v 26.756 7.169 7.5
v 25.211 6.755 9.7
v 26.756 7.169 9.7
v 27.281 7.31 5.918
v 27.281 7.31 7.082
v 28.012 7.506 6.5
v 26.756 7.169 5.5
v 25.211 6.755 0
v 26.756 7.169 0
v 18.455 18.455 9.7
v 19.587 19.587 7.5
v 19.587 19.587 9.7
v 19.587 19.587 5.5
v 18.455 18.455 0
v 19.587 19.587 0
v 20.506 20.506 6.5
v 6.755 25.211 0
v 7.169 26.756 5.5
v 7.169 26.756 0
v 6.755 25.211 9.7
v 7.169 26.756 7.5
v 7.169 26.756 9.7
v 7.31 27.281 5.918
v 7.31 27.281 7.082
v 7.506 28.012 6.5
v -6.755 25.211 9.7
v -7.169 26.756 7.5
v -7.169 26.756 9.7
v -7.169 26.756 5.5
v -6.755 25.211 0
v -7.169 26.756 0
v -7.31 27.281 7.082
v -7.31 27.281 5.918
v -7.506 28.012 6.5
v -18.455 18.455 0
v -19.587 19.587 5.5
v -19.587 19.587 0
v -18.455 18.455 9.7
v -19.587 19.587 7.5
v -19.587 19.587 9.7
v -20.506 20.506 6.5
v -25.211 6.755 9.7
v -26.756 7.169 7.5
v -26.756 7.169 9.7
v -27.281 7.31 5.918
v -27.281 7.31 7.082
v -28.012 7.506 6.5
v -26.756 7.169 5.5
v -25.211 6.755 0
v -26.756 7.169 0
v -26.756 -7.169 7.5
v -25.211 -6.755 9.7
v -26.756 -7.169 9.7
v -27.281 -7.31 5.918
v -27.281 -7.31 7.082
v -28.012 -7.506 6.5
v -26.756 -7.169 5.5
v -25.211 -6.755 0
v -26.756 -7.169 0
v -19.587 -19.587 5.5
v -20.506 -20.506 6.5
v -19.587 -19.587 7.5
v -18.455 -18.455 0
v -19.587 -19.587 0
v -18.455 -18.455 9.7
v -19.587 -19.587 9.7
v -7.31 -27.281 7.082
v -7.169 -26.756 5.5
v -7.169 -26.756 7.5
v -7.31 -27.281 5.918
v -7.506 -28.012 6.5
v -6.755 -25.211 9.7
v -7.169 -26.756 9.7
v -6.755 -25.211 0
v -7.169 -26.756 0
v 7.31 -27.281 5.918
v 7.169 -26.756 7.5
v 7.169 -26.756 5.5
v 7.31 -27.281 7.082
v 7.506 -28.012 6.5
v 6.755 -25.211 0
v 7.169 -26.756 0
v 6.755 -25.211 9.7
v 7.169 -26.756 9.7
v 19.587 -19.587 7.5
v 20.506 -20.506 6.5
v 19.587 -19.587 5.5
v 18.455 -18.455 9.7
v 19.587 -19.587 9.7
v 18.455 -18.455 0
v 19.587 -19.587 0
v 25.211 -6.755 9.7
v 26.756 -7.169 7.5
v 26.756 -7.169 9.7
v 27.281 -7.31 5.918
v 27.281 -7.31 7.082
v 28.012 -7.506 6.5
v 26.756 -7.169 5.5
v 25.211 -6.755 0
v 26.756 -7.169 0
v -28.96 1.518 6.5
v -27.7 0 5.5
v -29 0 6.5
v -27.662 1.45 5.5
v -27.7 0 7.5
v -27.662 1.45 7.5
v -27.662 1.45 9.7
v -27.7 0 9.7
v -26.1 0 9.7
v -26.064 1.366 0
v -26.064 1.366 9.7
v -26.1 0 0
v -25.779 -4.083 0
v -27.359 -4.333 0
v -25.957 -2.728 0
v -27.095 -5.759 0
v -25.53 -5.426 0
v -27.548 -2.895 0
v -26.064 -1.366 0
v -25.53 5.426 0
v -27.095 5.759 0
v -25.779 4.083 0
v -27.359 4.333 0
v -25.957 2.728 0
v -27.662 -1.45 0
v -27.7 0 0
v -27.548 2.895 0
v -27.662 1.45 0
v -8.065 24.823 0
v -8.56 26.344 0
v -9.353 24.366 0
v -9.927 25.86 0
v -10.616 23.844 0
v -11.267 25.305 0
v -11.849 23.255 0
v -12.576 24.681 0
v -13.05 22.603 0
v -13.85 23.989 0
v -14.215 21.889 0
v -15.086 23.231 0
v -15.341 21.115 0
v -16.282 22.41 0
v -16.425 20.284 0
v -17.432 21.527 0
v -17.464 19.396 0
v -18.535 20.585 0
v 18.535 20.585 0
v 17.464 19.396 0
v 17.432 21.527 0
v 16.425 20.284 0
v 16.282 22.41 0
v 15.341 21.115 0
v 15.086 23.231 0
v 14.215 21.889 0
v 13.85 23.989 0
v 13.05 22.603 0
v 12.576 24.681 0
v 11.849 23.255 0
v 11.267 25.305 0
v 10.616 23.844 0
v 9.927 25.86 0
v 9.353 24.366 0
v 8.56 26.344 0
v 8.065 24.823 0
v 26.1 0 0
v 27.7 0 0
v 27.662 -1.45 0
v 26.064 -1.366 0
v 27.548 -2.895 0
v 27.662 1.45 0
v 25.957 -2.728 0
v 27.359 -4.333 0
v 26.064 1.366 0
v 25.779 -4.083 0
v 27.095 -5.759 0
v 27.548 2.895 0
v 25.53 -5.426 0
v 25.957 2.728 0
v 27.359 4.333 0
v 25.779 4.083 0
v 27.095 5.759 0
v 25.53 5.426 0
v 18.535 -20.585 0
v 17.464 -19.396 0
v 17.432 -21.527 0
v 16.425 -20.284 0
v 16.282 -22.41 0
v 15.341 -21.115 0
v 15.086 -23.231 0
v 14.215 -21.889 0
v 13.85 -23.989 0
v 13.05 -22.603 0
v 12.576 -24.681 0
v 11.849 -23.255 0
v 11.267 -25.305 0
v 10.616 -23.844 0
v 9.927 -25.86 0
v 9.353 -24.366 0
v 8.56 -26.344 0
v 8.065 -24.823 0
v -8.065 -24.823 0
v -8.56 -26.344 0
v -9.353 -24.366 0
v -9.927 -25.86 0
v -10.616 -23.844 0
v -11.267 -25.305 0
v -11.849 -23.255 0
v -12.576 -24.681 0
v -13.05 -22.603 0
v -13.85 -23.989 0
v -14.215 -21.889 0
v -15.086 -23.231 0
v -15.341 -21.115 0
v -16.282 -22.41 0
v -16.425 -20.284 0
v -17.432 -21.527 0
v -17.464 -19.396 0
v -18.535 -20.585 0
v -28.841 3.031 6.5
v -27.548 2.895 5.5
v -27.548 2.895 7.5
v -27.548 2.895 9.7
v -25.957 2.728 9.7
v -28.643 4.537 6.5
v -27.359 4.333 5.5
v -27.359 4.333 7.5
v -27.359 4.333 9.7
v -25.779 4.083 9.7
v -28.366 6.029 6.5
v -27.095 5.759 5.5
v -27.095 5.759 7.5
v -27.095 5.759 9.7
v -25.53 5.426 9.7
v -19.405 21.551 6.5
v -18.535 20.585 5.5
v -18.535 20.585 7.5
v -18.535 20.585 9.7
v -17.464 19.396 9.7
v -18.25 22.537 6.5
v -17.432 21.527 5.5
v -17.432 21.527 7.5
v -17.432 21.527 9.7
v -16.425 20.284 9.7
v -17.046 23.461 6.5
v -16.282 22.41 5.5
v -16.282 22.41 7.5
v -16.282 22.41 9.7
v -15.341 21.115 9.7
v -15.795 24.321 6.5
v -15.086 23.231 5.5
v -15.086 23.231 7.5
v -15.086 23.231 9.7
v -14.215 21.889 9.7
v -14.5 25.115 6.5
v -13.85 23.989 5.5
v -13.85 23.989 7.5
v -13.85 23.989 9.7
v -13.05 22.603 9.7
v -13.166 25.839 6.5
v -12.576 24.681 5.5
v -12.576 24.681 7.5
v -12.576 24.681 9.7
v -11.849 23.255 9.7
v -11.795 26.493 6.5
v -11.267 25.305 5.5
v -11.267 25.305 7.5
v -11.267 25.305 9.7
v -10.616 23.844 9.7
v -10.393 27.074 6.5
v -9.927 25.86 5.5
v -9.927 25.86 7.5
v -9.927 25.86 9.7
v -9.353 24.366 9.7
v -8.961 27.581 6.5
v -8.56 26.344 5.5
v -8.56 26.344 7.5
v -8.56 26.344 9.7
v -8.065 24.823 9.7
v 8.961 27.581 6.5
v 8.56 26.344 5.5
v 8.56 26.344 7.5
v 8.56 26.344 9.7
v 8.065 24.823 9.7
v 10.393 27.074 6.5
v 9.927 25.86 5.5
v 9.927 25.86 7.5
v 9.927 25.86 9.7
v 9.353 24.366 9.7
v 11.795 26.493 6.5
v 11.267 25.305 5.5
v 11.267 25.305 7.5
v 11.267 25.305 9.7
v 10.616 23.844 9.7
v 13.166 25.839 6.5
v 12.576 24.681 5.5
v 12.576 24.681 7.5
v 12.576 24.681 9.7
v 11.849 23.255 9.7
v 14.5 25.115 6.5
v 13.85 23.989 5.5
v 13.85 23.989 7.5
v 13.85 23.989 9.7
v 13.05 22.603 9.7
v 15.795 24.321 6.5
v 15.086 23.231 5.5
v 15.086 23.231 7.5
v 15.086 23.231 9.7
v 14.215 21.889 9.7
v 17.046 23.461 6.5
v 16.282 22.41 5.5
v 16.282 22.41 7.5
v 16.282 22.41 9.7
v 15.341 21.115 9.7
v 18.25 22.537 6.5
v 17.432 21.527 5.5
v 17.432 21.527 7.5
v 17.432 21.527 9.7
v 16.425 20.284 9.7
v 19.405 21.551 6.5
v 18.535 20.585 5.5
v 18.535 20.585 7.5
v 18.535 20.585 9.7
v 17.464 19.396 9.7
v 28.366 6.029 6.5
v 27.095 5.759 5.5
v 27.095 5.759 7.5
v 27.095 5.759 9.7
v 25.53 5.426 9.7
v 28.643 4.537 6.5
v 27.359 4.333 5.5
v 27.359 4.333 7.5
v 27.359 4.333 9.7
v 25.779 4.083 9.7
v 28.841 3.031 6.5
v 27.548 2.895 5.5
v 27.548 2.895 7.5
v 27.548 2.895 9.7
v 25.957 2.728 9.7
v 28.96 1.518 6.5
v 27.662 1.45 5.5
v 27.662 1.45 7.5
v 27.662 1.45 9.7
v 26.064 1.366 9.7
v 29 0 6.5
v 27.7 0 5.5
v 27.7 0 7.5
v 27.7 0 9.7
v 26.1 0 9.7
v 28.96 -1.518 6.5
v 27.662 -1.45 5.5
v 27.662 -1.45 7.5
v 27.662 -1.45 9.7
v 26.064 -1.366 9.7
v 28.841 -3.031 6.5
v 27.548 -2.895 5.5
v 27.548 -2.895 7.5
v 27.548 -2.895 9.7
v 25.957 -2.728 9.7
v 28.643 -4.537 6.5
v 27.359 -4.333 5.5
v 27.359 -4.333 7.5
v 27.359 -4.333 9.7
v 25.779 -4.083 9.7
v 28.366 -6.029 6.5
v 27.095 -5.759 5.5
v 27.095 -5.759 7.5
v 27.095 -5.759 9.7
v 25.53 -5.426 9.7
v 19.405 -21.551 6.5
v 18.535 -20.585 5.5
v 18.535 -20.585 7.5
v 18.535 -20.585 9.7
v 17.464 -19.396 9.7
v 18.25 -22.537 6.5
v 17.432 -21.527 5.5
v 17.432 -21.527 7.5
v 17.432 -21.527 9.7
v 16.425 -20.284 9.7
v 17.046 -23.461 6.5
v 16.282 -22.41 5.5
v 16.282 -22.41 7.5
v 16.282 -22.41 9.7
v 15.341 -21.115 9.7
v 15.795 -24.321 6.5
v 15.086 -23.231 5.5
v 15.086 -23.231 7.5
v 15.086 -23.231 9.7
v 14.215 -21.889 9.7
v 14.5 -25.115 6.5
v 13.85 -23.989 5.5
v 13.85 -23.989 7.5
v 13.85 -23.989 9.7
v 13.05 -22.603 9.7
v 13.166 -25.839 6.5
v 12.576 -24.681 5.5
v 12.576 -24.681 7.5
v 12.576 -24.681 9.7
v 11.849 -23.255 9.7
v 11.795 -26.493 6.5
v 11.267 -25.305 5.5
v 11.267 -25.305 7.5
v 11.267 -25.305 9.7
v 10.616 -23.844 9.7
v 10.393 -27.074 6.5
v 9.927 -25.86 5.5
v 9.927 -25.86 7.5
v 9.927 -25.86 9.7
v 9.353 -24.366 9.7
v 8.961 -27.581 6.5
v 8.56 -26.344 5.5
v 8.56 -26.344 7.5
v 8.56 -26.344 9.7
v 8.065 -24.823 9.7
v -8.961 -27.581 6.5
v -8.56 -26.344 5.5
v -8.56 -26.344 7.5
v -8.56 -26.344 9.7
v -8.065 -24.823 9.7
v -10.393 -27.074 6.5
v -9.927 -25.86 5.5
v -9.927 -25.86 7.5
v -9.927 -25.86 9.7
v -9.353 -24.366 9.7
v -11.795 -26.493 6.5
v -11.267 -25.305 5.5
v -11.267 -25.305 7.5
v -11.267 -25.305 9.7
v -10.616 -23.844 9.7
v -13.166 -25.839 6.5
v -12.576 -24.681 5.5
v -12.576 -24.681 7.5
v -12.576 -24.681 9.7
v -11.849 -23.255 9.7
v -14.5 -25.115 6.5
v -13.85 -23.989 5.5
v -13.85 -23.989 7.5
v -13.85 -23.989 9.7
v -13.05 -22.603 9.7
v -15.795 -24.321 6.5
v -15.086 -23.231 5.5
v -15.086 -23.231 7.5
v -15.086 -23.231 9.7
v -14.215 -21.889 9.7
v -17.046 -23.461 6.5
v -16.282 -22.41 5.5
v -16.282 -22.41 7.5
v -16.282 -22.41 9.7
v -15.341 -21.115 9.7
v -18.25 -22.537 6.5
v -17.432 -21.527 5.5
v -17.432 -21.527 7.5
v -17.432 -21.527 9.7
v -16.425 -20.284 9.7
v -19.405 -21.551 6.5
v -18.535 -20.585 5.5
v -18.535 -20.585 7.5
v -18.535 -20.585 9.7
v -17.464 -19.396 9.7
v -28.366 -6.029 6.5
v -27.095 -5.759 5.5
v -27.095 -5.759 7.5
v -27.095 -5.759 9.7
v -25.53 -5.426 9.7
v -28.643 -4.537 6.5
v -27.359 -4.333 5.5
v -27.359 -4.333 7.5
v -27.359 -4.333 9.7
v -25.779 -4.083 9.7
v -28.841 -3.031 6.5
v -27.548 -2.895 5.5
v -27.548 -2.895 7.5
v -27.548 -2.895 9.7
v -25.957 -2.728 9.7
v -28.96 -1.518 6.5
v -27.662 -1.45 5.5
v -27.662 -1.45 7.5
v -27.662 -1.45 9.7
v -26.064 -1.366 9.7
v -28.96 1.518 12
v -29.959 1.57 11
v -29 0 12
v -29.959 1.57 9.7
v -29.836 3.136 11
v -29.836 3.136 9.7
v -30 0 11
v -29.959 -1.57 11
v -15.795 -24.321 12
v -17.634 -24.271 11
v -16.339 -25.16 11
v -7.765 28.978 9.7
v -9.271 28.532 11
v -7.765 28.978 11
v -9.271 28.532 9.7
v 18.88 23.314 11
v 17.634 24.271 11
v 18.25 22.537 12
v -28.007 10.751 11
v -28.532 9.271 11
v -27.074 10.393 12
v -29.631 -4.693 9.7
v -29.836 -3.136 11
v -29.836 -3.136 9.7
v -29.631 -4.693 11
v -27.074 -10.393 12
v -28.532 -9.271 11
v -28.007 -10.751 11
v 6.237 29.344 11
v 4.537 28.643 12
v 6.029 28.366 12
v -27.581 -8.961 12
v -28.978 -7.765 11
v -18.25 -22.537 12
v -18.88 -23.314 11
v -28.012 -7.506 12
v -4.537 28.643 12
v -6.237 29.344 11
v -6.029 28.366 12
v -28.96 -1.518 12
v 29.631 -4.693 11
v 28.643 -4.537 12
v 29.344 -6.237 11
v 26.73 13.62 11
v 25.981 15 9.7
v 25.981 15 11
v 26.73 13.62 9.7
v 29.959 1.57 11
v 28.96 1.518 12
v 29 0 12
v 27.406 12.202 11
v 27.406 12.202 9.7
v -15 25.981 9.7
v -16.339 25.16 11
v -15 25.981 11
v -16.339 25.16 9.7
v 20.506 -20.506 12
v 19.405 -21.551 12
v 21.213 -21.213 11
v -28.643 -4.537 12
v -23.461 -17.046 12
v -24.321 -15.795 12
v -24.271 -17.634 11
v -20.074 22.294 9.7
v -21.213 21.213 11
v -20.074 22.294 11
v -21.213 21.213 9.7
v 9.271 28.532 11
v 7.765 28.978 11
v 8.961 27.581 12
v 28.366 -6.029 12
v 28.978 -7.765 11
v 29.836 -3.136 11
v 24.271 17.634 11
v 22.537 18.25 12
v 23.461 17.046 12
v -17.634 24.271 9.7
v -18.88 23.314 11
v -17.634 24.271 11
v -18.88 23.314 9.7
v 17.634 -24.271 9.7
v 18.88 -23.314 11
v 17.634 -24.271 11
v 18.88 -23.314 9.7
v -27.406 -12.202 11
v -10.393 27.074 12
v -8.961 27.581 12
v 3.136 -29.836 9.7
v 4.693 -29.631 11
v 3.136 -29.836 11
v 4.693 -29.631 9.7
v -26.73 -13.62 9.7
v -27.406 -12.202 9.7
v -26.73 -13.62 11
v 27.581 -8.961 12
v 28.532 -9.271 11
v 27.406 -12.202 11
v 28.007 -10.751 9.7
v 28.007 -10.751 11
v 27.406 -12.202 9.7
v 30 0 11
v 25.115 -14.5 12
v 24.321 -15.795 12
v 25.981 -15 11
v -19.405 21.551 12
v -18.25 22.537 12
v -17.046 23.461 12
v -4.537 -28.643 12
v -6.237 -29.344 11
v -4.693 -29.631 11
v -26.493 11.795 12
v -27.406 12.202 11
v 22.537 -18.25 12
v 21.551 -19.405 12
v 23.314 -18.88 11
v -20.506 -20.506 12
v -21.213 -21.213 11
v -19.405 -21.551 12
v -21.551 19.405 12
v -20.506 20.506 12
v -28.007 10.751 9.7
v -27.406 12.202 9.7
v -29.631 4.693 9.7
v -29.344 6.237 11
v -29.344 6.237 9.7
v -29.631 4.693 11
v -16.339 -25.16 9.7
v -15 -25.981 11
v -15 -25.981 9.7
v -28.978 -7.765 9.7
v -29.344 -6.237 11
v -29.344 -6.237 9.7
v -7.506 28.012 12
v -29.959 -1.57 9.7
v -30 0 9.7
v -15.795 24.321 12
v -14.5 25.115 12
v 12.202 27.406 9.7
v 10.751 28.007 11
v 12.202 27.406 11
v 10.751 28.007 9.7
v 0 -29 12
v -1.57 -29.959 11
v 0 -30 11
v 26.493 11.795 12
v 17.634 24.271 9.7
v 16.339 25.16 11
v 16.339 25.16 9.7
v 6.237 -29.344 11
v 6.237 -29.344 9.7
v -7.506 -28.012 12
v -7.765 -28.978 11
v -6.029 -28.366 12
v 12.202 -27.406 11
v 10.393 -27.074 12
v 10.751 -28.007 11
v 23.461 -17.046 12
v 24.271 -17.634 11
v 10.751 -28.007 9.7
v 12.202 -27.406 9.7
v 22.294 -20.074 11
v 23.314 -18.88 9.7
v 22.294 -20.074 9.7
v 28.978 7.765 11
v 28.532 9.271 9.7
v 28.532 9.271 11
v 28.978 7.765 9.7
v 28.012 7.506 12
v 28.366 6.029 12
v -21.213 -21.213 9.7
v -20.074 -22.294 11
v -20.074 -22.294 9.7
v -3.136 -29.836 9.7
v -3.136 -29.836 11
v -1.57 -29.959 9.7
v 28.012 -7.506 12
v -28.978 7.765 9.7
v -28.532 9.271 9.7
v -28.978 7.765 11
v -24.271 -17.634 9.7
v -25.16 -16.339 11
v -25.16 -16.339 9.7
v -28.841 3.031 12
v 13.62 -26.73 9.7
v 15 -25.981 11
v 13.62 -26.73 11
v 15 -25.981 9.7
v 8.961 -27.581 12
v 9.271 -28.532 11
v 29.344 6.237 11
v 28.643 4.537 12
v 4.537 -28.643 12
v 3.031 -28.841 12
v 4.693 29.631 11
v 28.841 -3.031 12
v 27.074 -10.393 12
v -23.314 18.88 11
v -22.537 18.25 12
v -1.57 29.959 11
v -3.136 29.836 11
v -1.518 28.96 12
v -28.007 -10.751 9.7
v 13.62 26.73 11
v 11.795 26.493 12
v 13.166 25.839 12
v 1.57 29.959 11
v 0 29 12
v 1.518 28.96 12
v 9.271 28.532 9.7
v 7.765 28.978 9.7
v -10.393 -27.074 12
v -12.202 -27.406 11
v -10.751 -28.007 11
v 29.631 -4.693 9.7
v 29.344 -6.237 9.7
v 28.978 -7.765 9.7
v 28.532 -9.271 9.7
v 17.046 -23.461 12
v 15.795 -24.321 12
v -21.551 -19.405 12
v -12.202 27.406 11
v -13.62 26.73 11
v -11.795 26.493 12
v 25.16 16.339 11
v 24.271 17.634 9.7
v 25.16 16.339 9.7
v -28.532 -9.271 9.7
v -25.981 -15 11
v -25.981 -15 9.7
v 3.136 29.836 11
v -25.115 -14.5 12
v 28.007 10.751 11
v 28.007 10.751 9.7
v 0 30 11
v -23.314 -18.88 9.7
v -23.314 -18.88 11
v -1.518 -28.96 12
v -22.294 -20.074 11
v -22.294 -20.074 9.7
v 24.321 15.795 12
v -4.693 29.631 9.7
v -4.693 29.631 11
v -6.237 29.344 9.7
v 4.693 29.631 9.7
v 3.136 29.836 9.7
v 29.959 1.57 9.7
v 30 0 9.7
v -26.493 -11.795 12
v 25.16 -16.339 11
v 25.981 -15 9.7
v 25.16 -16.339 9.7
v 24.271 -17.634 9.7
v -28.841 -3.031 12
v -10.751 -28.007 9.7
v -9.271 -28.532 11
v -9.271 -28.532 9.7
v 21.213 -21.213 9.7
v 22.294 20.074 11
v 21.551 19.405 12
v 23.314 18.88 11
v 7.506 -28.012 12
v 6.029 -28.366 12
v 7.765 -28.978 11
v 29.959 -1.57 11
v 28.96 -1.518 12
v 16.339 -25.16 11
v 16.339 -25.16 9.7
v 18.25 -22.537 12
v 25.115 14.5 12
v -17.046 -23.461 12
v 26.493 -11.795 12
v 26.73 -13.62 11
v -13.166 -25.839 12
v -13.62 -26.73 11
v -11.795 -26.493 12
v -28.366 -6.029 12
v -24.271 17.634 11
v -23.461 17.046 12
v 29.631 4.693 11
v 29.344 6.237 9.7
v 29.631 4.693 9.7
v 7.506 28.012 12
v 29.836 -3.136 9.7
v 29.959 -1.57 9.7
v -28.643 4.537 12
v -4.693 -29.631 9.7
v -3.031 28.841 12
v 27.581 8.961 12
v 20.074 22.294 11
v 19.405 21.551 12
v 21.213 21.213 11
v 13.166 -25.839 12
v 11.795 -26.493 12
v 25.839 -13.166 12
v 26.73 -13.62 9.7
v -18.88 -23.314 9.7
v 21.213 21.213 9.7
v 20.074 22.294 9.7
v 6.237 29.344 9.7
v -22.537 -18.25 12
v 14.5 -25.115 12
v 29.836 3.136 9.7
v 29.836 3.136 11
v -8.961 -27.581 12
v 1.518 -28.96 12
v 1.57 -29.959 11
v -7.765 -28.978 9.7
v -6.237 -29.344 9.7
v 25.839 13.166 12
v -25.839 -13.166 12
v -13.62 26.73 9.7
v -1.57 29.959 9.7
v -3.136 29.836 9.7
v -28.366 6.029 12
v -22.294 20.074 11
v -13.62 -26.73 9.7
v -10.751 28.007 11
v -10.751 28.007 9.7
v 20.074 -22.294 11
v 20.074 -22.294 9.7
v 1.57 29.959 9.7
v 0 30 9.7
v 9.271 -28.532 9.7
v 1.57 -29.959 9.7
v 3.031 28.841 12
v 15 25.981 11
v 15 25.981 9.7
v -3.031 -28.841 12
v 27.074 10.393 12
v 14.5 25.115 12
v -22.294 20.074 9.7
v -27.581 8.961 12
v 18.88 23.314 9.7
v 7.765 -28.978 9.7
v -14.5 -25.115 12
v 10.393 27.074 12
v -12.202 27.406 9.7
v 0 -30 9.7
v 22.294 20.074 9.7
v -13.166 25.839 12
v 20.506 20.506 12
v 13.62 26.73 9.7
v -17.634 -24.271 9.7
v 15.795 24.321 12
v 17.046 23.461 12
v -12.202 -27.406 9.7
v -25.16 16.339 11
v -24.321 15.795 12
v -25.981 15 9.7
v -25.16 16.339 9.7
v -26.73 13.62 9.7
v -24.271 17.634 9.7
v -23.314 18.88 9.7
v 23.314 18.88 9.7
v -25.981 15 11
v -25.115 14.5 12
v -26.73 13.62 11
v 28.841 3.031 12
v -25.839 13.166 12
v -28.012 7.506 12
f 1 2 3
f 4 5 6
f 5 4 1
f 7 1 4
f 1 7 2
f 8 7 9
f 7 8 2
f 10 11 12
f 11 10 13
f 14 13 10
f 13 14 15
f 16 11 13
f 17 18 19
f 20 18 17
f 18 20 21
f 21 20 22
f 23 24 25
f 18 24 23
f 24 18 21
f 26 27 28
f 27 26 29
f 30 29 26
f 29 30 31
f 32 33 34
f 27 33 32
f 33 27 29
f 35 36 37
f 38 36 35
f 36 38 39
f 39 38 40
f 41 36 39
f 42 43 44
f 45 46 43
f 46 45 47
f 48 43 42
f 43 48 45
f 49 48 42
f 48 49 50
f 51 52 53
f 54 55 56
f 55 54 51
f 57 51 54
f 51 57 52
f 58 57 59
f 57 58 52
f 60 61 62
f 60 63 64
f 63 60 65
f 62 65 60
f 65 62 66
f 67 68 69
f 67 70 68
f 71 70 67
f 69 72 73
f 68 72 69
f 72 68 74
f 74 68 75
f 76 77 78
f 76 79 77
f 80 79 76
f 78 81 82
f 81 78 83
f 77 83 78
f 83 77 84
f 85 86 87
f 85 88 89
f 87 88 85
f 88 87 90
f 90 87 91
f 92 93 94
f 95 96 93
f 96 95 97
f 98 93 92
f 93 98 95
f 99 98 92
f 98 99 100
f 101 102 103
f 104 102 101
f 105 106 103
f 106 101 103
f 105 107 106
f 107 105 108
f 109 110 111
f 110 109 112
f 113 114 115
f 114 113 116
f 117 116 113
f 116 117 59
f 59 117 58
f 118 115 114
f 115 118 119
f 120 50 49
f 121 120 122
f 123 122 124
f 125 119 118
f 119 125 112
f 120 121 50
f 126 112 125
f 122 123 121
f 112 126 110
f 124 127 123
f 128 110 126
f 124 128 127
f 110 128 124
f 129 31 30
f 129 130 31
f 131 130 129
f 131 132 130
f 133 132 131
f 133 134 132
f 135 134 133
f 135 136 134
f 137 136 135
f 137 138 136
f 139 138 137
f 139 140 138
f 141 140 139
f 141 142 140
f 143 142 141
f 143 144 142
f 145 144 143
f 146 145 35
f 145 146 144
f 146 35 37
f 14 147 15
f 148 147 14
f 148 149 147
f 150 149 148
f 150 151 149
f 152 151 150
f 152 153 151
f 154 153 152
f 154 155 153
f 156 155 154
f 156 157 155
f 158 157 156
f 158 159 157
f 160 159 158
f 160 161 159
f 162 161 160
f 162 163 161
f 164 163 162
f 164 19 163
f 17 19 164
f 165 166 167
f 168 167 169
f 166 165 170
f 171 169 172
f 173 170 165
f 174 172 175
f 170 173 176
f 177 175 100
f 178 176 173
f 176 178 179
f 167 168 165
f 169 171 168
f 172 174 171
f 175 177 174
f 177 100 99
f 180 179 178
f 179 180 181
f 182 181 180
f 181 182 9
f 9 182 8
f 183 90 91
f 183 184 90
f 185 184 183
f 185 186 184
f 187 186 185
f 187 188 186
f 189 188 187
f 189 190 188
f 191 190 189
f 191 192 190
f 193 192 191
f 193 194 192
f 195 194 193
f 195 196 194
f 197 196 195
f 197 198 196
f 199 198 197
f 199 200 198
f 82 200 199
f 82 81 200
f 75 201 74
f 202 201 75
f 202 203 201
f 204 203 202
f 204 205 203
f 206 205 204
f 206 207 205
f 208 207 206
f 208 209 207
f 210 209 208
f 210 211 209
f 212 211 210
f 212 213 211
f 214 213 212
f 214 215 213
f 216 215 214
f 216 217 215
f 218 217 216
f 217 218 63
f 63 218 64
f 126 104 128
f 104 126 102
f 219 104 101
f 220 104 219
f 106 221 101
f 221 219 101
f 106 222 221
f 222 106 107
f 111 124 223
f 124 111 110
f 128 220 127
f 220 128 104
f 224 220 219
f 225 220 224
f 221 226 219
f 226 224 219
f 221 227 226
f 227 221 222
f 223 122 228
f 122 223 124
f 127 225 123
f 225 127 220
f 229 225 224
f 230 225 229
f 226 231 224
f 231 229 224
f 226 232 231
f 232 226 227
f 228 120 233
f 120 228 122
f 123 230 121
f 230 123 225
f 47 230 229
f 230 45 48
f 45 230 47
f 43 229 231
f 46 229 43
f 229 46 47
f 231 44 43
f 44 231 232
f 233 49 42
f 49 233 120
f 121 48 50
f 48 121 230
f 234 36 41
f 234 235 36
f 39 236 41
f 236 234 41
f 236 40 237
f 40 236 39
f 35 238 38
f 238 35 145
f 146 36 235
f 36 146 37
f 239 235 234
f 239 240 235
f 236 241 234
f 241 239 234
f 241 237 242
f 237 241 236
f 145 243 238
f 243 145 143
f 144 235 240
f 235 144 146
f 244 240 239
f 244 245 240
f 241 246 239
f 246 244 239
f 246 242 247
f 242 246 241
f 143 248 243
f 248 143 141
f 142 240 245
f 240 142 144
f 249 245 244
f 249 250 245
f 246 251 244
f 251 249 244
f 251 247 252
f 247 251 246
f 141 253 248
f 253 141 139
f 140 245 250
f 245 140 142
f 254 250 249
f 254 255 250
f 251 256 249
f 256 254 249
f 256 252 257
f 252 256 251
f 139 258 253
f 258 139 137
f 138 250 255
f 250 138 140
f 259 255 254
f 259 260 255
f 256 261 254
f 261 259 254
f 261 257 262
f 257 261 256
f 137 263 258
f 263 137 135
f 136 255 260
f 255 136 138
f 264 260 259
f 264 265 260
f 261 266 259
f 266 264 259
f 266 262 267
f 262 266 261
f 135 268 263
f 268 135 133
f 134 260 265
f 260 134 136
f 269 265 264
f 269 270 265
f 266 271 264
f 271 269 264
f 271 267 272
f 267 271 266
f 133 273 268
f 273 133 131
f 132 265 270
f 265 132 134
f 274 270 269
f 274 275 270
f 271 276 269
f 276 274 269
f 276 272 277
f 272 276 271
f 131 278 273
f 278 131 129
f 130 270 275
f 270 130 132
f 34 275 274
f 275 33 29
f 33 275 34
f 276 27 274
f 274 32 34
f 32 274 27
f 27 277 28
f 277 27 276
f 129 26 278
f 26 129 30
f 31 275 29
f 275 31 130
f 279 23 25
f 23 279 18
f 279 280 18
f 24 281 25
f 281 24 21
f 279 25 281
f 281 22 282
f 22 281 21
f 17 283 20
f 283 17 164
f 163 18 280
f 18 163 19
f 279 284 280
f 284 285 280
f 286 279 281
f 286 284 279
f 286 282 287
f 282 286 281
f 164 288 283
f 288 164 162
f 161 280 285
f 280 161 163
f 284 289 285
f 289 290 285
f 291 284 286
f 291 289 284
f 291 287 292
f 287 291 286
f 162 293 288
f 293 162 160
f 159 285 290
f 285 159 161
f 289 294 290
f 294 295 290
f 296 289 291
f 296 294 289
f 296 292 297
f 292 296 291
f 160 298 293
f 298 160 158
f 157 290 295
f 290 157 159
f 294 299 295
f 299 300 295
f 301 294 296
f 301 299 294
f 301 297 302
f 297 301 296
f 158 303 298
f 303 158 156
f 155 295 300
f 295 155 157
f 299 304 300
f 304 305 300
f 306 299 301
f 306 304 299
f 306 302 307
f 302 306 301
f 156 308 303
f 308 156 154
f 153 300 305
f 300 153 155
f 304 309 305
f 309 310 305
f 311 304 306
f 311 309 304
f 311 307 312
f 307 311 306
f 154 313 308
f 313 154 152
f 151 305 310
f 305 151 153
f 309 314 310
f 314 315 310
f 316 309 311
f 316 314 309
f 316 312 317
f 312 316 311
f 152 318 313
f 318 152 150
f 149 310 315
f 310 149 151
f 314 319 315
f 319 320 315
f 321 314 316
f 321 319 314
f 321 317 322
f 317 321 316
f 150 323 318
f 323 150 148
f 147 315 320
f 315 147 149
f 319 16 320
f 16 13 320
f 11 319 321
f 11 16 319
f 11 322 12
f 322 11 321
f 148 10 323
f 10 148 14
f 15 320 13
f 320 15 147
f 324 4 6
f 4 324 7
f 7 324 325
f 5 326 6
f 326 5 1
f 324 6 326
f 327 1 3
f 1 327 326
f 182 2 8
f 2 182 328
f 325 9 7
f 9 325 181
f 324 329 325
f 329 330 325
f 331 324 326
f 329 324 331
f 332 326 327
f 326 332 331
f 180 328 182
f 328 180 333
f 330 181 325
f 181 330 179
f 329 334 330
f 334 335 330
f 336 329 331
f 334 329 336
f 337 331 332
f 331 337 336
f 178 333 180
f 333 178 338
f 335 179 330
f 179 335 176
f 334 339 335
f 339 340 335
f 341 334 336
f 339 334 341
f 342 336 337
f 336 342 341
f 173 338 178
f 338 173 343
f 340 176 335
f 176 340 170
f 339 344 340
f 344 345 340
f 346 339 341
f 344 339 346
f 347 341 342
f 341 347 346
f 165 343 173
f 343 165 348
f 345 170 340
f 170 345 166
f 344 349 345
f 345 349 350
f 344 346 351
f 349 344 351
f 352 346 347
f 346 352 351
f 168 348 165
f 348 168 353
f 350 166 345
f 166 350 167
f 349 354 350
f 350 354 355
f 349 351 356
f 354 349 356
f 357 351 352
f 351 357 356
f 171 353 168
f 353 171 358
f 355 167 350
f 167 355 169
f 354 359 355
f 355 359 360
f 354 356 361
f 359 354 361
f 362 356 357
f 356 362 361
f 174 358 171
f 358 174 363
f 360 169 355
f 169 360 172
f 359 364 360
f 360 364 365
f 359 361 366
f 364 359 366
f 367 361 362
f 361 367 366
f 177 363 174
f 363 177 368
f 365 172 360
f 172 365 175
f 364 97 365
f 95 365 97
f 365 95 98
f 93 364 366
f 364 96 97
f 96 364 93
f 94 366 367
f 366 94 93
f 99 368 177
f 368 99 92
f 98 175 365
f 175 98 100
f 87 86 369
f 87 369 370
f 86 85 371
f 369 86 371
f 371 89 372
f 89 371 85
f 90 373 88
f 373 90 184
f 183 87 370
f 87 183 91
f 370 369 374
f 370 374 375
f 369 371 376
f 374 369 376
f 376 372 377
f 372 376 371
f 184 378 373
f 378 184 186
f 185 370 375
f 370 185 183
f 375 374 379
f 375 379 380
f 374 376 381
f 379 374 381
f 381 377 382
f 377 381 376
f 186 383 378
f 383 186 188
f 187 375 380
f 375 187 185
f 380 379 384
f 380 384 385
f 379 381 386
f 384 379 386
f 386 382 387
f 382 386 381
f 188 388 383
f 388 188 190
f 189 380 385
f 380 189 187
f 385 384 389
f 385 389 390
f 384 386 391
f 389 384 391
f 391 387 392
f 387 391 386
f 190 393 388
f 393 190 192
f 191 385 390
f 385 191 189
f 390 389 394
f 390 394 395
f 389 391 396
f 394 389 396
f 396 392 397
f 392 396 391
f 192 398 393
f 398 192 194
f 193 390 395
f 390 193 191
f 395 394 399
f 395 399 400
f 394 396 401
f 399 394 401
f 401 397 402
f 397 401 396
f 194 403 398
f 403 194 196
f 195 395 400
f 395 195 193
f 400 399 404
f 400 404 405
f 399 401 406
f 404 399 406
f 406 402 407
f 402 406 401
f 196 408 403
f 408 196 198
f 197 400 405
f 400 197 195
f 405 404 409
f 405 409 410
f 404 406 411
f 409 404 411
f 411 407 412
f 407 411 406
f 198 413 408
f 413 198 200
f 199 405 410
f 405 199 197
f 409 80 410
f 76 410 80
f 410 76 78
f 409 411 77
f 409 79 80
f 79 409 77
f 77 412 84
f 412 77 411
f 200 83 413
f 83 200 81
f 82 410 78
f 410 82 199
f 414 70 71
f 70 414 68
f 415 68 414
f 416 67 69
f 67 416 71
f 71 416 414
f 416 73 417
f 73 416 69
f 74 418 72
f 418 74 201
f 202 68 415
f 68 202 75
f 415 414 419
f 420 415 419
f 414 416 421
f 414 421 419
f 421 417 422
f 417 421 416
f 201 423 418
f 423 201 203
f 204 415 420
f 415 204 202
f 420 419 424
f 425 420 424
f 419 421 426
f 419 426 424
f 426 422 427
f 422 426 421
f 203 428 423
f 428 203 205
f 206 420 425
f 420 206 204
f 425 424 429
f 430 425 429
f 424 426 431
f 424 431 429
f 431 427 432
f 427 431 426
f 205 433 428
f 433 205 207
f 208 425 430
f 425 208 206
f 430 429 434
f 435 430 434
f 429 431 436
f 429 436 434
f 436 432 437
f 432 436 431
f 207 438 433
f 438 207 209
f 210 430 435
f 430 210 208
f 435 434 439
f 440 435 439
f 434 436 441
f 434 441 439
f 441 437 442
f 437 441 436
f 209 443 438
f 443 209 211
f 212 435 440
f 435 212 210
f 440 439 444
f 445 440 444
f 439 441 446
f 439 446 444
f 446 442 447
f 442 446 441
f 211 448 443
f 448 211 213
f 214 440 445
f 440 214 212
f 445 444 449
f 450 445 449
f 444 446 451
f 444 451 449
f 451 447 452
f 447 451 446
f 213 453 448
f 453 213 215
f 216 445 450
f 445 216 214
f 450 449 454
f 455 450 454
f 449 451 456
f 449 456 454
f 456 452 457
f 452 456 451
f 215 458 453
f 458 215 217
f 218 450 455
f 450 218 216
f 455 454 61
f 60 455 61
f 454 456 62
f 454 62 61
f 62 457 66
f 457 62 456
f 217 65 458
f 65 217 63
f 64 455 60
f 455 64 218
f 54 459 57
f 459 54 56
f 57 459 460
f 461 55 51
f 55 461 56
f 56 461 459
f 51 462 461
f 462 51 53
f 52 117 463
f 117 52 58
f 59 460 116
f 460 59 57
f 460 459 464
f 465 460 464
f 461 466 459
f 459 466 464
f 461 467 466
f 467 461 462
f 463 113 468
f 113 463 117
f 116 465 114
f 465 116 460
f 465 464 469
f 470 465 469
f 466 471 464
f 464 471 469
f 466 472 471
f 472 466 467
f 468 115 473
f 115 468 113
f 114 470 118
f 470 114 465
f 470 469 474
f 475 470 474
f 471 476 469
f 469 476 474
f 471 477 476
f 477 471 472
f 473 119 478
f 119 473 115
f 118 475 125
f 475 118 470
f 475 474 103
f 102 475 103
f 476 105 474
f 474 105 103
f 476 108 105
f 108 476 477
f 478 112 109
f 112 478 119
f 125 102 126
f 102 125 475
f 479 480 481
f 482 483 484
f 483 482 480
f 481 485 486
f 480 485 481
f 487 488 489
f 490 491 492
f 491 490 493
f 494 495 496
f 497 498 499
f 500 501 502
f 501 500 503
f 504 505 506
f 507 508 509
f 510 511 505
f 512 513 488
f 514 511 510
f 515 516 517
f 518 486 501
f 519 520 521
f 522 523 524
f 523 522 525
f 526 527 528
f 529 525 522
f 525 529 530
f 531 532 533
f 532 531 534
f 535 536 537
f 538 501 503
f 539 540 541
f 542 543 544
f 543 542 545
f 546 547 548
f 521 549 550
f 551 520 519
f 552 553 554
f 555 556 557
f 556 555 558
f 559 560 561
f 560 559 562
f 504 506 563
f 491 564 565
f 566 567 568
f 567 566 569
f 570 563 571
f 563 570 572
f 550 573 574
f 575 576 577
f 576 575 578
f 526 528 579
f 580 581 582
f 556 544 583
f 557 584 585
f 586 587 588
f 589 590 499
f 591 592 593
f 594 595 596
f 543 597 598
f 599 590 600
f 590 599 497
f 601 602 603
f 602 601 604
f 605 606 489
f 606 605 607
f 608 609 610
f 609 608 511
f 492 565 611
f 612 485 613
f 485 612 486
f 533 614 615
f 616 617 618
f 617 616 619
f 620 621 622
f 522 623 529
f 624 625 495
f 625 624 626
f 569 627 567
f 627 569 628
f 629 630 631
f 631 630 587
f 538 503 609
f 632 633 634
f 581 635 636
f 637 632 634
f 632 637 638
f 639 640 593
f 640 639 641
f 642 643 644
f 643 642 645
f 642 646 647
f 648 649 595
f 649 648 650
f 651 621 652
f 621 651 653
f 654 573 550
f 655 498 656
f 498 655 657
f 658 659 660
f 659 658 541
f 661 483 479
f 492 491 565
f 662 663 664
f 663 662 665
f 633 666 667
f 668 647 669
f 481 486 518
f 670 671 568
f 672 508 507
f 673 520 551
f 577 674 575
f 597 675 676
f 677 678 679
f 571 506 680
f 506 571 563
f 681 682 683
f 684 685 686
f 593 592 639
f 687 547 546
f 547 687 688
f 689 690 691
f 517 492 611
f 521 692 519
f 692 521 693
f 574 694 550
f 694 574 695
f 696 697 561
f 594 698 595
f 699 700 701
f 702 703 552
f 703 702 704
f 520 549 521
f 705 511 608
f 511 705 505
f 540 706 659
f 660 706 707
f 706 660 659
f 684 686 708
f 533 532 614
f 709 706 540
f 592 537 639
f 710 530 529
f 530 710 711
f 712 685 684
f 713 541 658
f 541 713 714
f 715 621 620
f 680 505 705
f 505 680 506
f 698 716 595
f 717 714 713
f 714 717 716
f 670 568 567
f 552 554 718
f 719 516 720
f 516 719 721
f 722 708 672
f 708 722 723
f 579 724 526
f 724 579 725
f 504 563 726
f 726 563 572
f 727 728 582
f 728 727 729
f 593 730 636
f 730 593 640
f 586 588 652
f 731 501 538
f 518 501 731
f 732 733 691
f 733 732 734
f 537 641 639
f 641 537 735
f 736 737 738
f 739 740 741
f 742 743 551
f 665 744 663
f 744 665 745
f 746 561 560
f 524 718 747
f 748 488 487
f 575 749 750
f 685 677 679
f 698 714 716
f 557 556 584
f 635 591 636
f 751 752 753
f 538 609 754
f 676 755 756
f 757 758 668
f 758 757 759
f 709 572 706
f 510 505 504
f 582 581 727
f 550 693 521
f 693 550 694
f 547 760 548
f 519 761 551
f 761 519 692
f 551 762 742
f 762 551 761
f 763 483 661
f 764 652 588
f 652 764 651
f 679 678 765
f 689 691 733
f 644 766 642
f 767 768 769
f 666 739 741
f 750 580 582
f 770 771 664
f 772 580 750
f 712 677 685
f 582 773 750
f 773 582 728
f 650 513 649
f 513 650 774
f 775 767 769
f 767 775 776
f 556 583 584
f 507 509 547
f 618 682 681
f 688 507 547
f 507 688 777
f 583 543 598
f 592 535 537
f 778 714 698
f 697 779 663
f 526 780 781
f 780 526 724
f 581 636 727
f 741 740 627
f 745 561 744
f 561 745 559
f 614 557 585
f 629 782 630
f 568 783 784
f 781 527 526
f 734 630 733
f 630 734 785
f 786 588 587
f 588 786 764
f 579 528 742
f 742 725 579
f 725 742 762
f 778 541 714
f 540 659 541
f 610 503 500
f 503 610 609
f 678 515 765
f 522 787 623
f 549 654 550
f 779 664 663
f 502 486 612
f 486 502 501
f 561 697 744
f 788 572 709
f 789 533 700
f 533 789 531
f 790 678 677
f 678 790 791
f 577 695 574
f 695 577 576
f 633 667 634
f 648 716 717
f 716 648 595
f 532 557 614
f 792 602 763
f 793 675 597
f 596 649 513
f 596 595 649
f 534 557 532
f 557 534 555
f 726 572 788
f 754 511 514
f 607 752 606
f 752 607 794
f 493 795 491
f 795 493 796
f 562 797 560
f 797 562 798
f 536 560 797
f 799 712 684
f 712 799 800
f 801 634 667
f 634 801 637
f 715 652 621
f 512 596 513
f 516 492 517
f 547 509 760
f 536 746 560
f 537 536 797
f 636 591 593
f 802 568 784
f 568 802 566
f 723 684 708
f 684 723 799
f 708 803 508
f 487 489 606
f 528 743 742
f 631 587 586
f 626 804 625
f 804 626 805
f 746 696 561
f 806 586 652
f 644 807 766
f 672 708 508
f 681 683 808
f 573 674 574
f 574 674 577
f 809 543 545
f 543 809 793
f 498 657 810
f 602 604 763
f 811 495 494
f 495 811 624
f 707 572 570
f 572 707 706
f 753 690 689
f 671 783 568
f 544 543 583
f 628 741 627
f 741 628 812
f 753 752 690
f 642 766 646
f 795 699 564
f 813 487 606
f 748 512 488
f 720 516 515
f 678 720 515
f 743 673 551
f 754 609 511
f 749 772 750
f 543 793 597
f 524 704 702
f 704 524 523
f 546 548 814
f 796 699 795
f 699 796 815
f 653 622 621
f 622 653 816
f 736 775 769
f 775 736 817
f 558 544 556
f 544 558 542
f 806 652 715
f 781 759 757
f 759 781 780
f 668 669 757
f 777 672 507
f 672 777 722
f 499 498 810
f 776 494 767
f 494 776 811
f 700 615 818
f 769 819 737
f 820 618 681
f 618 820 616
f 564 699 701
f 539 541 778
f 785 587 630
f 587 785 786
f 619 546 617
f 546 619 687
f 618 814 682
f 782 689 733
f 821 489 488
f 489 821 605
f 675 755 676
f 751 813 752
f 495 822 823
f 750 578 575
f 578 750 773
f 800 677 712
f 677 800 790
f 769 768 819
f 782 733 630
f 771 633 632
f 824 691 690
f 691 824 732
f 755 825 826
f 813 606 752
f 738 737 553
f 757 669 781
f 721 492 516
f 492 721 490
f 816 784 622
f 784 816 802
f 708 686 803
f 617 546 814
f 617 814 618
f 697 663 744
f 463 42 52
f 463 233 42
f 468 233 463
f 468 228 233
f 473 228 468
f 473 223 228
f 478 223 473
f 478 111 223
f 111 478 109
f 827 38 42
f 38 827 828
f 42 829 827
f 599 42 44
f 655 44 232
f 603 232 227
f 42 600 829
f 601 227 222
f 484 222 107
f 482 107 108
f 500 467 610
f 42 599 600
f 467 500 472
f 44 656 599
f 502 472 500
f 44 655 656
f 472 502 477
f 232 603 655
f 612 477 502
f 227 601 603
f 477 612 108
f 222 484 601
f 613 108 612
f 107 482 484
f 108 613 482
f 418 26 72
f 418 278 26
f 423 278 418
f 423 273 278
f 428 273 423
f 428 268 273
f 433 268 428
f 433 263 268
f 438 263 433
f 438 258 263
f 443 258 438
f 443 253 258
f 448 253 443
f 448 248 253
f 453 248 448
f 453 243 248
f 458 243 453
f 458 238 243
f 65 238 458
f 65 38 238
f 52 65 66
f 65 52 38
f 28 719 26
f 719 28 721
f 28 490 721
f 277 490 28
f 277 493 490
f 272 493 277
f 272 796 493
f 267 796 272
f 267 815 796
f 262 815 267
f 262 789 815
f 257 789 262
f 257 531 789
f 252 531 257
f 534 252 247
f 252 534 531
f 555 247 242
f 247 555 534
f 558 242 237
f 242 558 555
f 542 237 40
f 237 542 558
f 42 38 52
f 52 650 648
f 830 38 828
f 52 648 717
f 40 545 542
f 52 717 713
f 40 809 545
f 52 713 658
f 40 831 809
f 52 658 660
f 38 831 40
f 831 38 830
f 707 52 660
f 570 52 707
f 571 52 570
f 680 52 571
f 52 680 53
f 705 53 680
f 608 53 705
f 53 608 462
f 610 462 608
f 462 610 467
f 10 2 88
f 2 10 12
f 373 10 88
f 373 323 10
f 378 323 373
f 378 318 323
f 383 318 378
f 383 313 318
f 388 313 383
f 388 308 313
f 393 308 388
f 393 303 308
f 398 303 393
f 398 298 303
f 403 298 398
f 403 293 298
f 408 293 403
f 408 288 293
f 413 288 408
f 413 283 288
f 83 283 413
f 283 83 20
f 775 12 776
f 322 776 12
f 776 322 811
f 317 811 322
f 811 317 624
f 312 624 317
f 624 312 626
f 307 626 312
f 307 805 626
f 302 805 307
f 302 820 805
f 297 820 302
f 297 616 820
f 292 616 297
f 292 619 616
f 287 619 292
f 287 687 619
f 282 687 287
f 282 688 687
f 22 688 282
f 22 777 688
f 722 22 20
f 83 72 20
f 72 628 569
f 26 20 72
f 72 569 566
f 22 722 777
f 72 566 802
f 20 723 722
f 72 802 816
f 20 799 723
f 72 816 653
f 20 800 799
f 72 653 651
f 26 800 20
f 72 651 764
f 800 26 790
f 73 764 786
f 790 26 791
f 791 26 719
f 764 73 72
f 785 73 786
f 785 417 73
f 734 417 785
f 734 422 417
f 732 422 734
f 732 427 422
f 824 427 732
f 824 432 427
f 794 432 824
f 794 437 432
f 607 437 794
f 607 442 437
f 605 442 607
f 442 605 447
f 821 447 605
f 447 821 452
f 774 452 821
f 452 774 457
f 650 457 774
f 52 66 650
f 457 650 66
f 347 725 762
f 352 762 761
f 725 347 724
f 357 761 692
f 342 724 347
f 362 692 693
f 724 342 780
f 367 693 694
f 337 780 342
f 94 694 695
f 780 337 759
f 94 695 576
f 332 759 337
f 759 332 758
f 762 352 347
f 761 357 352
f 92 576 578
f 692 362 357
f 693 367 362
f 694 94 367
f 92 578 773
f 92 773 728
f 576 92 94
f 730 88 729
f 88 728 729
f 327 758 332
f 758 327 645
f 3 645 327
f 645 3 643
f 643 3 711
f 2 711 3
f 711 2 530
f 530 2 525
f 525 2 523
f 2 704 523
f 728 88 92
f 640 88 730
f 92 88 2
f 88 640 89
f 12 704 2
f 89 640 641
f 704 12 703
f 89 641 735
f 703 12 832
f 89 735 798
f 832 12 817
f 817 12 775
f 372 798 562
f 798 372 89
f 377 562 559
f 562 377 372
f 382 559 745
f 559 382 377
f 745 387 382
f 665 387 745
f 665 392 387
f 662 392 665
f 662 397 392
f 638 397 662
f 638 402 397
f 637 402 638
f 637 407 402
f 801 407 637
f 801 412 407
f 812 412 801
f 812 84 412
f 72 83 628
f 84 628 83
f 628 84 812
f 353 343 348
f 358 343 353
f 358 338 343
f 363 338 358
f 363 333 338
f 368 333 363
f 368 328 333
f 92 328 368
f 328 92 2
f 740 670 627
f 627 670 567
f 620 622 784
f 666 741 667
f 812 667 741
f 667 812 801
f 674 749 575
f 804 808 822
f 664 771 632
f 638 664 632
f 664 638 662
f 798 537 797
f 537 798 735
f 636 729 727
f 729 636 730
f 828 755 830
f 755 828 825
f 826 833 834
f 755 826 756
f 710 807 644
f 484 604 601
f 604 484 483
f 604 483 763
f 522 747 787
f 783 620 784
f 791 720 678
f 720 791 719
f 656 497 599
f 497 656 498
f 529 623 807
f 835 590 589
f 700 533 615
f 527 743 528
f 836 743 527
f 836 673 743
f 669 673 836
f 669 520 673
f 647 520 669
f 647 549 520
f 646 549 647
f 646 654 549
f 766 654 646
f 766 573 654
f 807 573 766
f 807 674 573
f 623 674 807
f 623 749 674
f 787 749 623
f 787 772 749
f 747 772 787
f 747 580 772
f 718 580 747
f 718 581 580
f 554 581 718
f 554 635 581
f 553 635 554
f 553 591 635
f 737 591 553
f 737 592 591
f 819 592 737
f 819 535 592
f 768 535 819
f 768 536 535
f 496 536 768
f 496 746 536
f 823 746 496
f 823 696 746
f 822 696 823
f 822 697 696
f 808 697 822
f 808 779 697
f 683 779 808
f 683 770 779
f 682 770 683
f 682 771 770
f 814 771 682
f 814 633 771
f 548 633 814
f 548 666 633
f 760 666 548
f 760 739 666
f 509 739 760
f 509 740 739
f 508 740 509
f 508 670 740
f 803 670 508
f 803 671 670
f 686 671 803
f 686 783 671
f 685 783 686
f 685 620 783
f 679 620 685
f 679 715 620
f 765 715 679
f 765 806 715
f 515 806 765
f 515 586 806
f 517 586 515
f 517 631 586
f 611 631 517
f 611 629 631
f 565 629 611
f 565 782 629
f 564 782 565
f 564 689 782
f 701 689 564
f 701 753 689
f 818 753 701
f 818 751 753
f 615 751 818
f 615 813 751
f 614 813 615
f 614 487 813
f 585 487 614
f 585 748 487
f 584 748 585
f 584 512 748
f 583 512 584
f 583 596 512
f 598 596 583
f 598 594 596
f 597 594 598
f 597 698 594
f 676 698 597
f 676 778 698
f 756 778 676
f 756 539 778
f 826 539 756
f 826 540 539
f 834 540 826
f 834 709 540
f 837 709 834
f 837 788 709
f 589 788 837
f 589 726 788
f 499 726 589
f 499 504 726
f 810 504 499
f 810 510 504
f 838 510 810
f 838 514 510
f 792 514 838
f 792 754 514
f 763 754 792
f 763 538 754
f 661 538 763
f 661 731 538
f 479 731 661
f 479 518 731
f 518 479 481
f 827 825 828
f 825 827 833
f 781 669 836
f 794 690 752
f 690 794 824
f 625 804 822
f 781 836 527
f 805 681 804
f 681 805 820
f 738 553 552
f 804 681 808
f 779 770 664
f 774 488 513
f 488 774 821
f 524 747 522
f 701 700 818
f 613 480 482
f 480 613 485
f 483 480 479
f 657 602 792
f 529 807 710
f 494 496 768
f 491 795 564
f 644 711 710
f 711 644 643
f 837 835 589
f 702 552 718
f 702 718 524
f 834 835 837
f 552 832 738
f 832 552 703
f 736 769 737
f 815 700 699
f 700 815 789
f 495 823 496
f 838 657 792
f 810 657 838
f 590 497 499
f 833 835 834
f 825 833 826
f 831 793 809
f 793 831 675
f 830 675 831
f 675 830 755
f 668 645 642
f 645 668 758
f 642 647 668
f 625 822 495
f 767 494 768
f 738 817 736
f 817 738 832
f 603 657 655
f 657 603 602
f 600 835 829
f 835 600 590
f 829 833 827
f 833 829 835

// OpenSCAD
// ============================================================
//  WheelCapDesigner – Nabendeckel-Generator (MakerWorld)
//  Parametrischer Nabendeckel mit Schnappnasen + Logo.
//  Web-Version mit freiem Logo-Upload & 3MF:
//     https://wheelcapdesigner-u4aa.vercel.app
//
//  Für MakerWorld Parametric Model Maker (OpenSCAD 2021).
//  Die SVG-Dateien (star.svg, bolt.svg, rings.svg) MIT hochladen.
//  Einheit: Millimeter (mm)
// ============================================================


/* [Grundmaße] */
// Außendurchmesser der sichtbaren Deckel-Oberseite (liegt auf dem Rad auf). Muss größer als Montage-Ø sein.
outer_diameter = 60;      // [20:0.5:220]
// Montage-/Klemmdurchmesser: Durchmesser der Radöffnung, in die der Deckel einrastet.
mount_diameter = 56;      // [15:0.5:210]
// Gesamthöhe / Einstecktiefe
total_height = 12;        // [5:0.5:60]
// Dicke der Deckel-Oberseite
face_thickness = 2.0;     // [0.8:0.2:6]

/* [Rand] */
// Fase (Abschrägung) an der oberen Außenkante
top_chamfer = 1.0;        // [0:0.2:8]

/* [Profil (CenterLock)] */
// Deckelprofil: Flach, CenterLock-Mutter (Sechskant) oder Kegel
cap_profile = "flat";       // [flat:Flach, dome:CenterLock (Mutter), cone:Kegel]
// Anzahl Ecken der Mutter (6 = Sechskant)
nut_sides = 6;              // [3:1:12]
// Durchmesser der Mutter (über die Ecken)
polygon_size = 44;          // [10:0.5:210]
// Höhe der Erhöhung
dome_height = 5;            // [1:0.5:20]
// Runde Plattform oben fürs Logo: Durchmesser
platform_diameter = 30;     // [5:0.5:200]
// Plattform-Lage
platform_mode = "flush";    // [flush:Bündig (keine extra Fläche), raised:Erhöht, recessed:Vertieft]
// Tiefe der Vertiefung (nur bei „Vertieft")
platform_depth = 1.5;       // [0.4:0.1:10]
// Obere Kanten der Mutter abrunden/fasen (0 = scharf)
rounding = 0.15;            // [0:0.05:0.6]

/* [Profil (Kegel)] */
// Dicke der geraden Grundplatte unten (nur bei Kegel)
cone_base = 2;              // [0:0.5:20]
// Gesamthöhe des Kegels
cone_height = 8;            // [2:0.5:40]
// Durchmesser der oberen Platte
cone_top_diameter = 30;     // [5:0.5:200]
// Erhabener Rand oben (0 = kein Rand)
cone_top_rim = 1.5;         // [0:0.1:8]
// Wandstärke der Höhlung (0 = massiv) – deckt herausstehende Achsen ab
cone_wall = 3;              // [0:0.5:8]

/* [Schnappnasen] */
// Anzahl der Clips
clip_count = 6;           // [2:1:16]
// Wandstärke eines Clips
clip_thickness = 1.6;     // [0.8:0.1:4]
// Winkelbreite eines Clips (Grad)
clip_width_deg = 30;      // [4:1:60]
// Höhe der Rastnase (Haltekraft)
barb_depth = 1.0;         // [0.2:0.1:4]
// Länge der Einführschräge
barb_ramp = 2.0;          // [0.5:0.1:8]
// Klemmdicke = Materialstärke des Rades
grip_thickness = 2.5;     // [0.5:0.1:12]
// Spiel/Toleranz (Druckertoleranz)
tolerance = 0.3;          // [0:0.05:1.5]

/* [Logo] */
// Logo-Quelle
logo_mode = "none";       // [none:Kein Logo, text:Text, shape:Form]
// Stil: Plan = bündige, 2-farbige Einlage (Oberseite aufs Druckbett)
logo_style = "raised";    // [raised:Erhaben, engraved:Graviert, flush:Plan (2-farbig)]
// Text (nur bei Quelle = Text)
logo_text = "LOGO";
// Schriftart
logo_font = "Liberation Sans:style=Bold";
// Form (nur bei Quelle = Form)
logo_shape = "star";      // [star:Stern, bolt:Blitz, rings:Ringe, hexagon:Sechseck, circle:Kreis-Ring]
// Zielgröße/-breite des Logos
logo_size = 30;           // [5:0.5:200]
// Höhe (erhaben) bzw. Tiefe (graviert/plan) des Logos
logo_depth = 1.0;         // [0.4:0.1:4]
// Outline-Ring am Deckelrand: Breite (0 = aus)
outline_width = 0;        // [0:0.2:15]
// Outline: Abstand von der Außenkante
outline_gap = 4;          // [0:0.5:40]
// Logo frei platzieren: Versatz X / Y
logo_offset_x = 0;        // [-40:0.5:40]
logo_offset_y = 0;        // [-40:0.5:40]
// Logo drehen (Grad)
logo_rotation = 0;        // [0:1:360]
// Vertiefte Kreisfläche unter dem Logo (0 = keine)
logo_recess_depth = 0;    // [0:0.1:3]
// Durchmesser der Vertiefung
logo_recess_diameter = 36;// [5:0.5:200]

/* [Farben] */
// Deckel-Farbe (Multicolor-Ausgabe)
cap_color = "#d7dbe1";
// Logo-/Einlage-Farbe (bei Erhaben & Plan)
logo_color = "#ff7a45";

/* [Qualität] */
// Auflösung der Rundungen
resolution = 120;         // [40:10:360]


/* [Hidden] */
// ---- abgeleitete Werte (nicht im Customizer sichtbar) ----
fn        = resolution;
top_r     = outer_diameter / 2;
skirt_r   = mount_diameter / 2 - tolerance;
inner_r   = max(1, skirt_r - clip_thickness);
barb_r    = mount_diameter / 2 + barb_depth;
skirt_h   = max(1, total_height - face_thickness);
ledge_z   = max(barb_ramp + 0.2, skirt_h - grip_thickness);
ramp_z    = max(0.1, ledge_z - barb_ramp);
// Fase an der Haltenase (Oberseite) – immer da: ~45°, selbsttragend beim Druck + saubere Rast
barb_fase = min(barb_depth, max(0.1, (ledge_z - ramp_z) * 0.85));
pitch     = 360 / clip_count;
clip_w    = min(clip_width_deg, pitch - 2);
gap_w     = max(1, pitch - clip_w);
chamfer   = min(top_chamfer, top_r - 0.5, face_thickness - 0.1);
H         = total_height;
depth     = max(0.4, logo_depth);

// ---- CenterLock (Mutter) ----
is_nut     = cap_profile == "dome";
n_sides    = max(3, nut_sides);
nut_r      = max(3, min(polygon_size / 2, top_r - 0.5));
dome_h     = max(0.5, dome_height);
plat_r     = min(max(2, platform_diameter / 2), nut_r);
round_ch   = max(0, min(0.6, rounding)) * min(dome_h * 0.8, nut_r * 0.5);
nut_bodyH  = max(0.2, dome_h - round_ch);
plat_h     = 1.2;
nut_top_z  = H + dome_h;
pocket_d   = min(platform_depth, dome_h - 0.4);

// ---- Kegel (cone) ----
is_cone    = cap_profile == "cone";
cone_baseR = max(3, top_r - chamfer);
cone_H     = max(1, cone_height);
cone_baseH = max(0, min(cone_base, cone_H - 0.6));
cone_topR  = max(2, min(cone_top_diameter / 2, cone_baseR - 0.5));
cone_rim   = max(0, cone_top_rim);
cone_rimW  = cone_rim > 0.05 ? min(max(1.2, cone_rim), cone_topR * 0.45) : 0;
cone_platR = cone_topR - cone_rimW;
cone_topZ  = H + cone_H;
// Höhlung (innen) – global; öffnet nach unten in den Innenraum
cone_wall_w   = max(0, cone_wall);
cone_inBaseR  = min(cone_baseR - cone_wall_w, inner_r - 0.6);
cone_inTopR   = cone_topR - cone_wall_w;
cone_ceilZ    = H + cone_H - cone_wall_w;
cone_hollow   = is_cone && cone_wall_w > 0.05
             && cone_inBaseR > 1 && cone_inTopR > 0.8
             && cone_ceilZ > H + cone_baseH + 0.5;

top_z      = is_cone ? cone_topZ
           : is_nut ? (platform_mode == "raised"   ? nut_top_z + plat_h
                     : platform_mode == "recessed" ? nut_top_z - pocket_d
                     :                               nut_top_z)
           : H;
outline_base_r = is_cone ? ((cone_rimW > 0 && cone_platR > 1) ? cone_platR : cone_topR)
               : is_nut  ? plat_r
               :           top_r;
surface_z = top_z - (logo_recess_depth > 0 ? logo_recess_depth : 0);

// ---- Bauteile ----
module skirt_ring() {
  rotate_extrude($fn = fn)
    polygon([
      [inner_r, 0], [skirt_r, 0], [skirt_r, ramp_z], [barb_r, ledge_z - barb_fase],
      [skirt_r, ledge_z], [skirt_r, skirt_h], [inner_r, skirt_h]
    ]);
}

module gaps() {
  for (i = [0 : clip_count - 1])
    rotate([0, 0, i * pitch + pitch / 2 - gap_w / 2])
      rotate_extrude(angle = gap_w, $fn = fn)
        translate([0.1, -0.3]) square([barb_r + 3, skirt_h + 0.6]);
}

module plate() {
  rotate_extrude($fn = fn)
    polygon([
      [0, skirt_h - 0.3], [top_r, skirt_h - 0.3],
      [top_r, H - chamfer], [top_r - chamfer, H], [0, H]
    ]);
}

// CenterLock-Mutter: senkrechte Facetten + optionale Fase an der Oberkante.
module nut_solid() {
  rotate([0, 0, 180 / n_sides])          // flache Seite nach vorn (wie Web)
    union() {
      cylinder(h = nut_bodyH, r = nut_r, $fn = n_sides);
      if (round_ch > 0.05)
        translate([0, 0, nut_bodyH])
          cylinder(h = round_ch, r1 = nut_r, r2 = max(nut_r * 0.25, nut_r - round_ch), $fn = n_sides);
    }
}

// Kegel (Konus): Grundplatte + Kegelmantel + obere Platte + optionaler Rand.
module cone_solid() {
  pts = concat(
    [[0, 0], [cone_baseR, 0]],
    cone_baseH > 0.05 ? [[cone_baseR, cone_baseH]] : [],
    [[cone_topR, cone_H]],
    (cone_rimW > 0 && cone_platR > 1)
      ? [[cone_topR, cone_H + cone_rim], [cone_platR, cone_H + cone_rim], [cone_platR, cone_H], [0, cone_H]]
      : [[0, cone_H]]
  );
  rotate_extrude($fn = fn) polygon(pts);
}

// Innen-Höhlung des Kegels (global). Öffnet unten durch die Deckplatte.
module cone_cavity() {
  rotate_extrude($fn = fn)
    polygon([
      [0, skirt_h - 1],
      [cone_inBaseR, skirt_h - 1],
      [cone_inBaseR, H + cone_baseH],
      [cone_inTopR, cone_ceilZ],
      [0, cone_ceilZ]
    ]);
}

module cap_body() {
  union() {
    difference() { skirt_ring(); gaps(); }
    plate();
    if (is_nut) translate([0, 0, H]) nut_solid();
    if (is_nut && platform_mode == "raised")
      translate([0, 0, nut_top_z]) cylinder(h = plat_h, r = plat_r, $fn = fn);
    if (is_cone) translate([0, 0, H]) cone_solid();
  }
}

module body_with_recess() {
  difference() {
    cap_body();
    // Vertiefte runde Plattform in die Mutteroberseite
    if (is_nut && platform_mode == "recessed")
      translate([0, 0, nut_top_z - pocket_d])
        cylinder(h = pocket_d + 0.4, r = plat_r, $fn = fn);
    // Vertiefter „Teller" unter dem Logo
    if (logo_mode != "none" && logo_recess_depth > 0)
      translate([0, 0, top_z - logo_recess_depth])
        cylinder(h = logo_recess_depth + 1, r = logo_recess_diameter / 2, $fn = fn);
    // Kegel innen aushöhlen (deckt herausstehende Achsen ab)
    if (cone_hollow) cone_cavity();
  }
}

// Prozedurale Formen – immer zentriert, exakt skaliert, keine Zusatzdateien.
module shape_star(s) {
  R = s / 2; r = R * 0.42;
  polygon([for (i = [0 : 9]) let(a = 90 + i * 36, rad = (i % 2 == 0) ? R : r) [rad * cos(a), rad * sin(a)]]);
}
module shape_bolt(s) {
  translate([-2, 0]) scale(s / 92) polygon([[8, 46], [-26, -6], [-2, -6], [-10, -46], [30, 10], [4, 10]]);
}
module shape_rings(s) {
  R = s / 2;
  difference() { circle(r = R, $fn = fn); circle(r = R * 0.80, $fn = fn); }
  circle(r = R * 0.28, $fn = fn);
}
module shape_hex(s)    { circle(r = s / 2, $fn = 6); }
module shape_circle(s) { difference() { circle(r = s / 2, $fn = fn); circle(r = s / 2 * 0.6, $fn = fn); } }

module logo_2d() {
  if (logo_mode == "text")
    text(logo_text, size = logo_size * 0.5, halign = "center", valign = "center", font = logo_font);
  else if (logo_mode == "shape") {
    if      (logo_shape == "star")    shape_star(logo_size);
    else if (logo_shape == "bolt")    shape_bolt(logo_size);
    else if (logo_shape == "rings")   shape_rings(logo_size);
    else if (logo_shape == "hexagon") shape_hex(logo_size);
    else if (logo_shape == "circle")  shape_circle(logo_size);
  }
}

module outline_2d() {
  if (outline_width > 0) {
    o = min(outline_base_r - outline_gap, outline_base_r - 0.5);
    i = max(1, o - outline_width);
    difference() { circle(r = o, $fn = fn); circle(r = i, $fn = fn); }
  }
}

// Zweitfarb-Fläche (Logo platziert + Outline zentriert)
module second_2d() {
  translate([logo_offset_x, logo_offset_y]) rotate(logo_rotation) logo_2d();
  outline_2d();
}
module second_3d(h, zbase) { translate([0, 0, zbase]) linear_extrude(height = h) second_2d(); }


// ============================================================
//  ZUSAMMENBAU  (mehrfarbig via color())
// ============================================================
if (logo_mode == "none") {
  color(cap_color) body_with_recess();

} else if (logo_style == "engraved") {
  color(cap_color) difference() {
    body_with_recess();
    second_3d(depth + 0.2, surface_z - depth + 0.1);
  }

} else if (logo_style == "flush") {
  // Plan: bündige Einlage – Deckel mit Tasche + farbige Einlage
  color(cap_color) difference() {
    body_with_recess();
    second_3d(depth + 0.3, surface_z - depth);   // Tasche (öffnet nach oben)
  }
  color(logo_color) second_3d(depth, surface_z - depth);  // Einlage, bündig

} else {  // raised
  color(cap_color) body_with_recess();
  color(logo_color) second_3d(depth, surface_z - 0.1);    // erhaben, leicht eingetaucht
}
